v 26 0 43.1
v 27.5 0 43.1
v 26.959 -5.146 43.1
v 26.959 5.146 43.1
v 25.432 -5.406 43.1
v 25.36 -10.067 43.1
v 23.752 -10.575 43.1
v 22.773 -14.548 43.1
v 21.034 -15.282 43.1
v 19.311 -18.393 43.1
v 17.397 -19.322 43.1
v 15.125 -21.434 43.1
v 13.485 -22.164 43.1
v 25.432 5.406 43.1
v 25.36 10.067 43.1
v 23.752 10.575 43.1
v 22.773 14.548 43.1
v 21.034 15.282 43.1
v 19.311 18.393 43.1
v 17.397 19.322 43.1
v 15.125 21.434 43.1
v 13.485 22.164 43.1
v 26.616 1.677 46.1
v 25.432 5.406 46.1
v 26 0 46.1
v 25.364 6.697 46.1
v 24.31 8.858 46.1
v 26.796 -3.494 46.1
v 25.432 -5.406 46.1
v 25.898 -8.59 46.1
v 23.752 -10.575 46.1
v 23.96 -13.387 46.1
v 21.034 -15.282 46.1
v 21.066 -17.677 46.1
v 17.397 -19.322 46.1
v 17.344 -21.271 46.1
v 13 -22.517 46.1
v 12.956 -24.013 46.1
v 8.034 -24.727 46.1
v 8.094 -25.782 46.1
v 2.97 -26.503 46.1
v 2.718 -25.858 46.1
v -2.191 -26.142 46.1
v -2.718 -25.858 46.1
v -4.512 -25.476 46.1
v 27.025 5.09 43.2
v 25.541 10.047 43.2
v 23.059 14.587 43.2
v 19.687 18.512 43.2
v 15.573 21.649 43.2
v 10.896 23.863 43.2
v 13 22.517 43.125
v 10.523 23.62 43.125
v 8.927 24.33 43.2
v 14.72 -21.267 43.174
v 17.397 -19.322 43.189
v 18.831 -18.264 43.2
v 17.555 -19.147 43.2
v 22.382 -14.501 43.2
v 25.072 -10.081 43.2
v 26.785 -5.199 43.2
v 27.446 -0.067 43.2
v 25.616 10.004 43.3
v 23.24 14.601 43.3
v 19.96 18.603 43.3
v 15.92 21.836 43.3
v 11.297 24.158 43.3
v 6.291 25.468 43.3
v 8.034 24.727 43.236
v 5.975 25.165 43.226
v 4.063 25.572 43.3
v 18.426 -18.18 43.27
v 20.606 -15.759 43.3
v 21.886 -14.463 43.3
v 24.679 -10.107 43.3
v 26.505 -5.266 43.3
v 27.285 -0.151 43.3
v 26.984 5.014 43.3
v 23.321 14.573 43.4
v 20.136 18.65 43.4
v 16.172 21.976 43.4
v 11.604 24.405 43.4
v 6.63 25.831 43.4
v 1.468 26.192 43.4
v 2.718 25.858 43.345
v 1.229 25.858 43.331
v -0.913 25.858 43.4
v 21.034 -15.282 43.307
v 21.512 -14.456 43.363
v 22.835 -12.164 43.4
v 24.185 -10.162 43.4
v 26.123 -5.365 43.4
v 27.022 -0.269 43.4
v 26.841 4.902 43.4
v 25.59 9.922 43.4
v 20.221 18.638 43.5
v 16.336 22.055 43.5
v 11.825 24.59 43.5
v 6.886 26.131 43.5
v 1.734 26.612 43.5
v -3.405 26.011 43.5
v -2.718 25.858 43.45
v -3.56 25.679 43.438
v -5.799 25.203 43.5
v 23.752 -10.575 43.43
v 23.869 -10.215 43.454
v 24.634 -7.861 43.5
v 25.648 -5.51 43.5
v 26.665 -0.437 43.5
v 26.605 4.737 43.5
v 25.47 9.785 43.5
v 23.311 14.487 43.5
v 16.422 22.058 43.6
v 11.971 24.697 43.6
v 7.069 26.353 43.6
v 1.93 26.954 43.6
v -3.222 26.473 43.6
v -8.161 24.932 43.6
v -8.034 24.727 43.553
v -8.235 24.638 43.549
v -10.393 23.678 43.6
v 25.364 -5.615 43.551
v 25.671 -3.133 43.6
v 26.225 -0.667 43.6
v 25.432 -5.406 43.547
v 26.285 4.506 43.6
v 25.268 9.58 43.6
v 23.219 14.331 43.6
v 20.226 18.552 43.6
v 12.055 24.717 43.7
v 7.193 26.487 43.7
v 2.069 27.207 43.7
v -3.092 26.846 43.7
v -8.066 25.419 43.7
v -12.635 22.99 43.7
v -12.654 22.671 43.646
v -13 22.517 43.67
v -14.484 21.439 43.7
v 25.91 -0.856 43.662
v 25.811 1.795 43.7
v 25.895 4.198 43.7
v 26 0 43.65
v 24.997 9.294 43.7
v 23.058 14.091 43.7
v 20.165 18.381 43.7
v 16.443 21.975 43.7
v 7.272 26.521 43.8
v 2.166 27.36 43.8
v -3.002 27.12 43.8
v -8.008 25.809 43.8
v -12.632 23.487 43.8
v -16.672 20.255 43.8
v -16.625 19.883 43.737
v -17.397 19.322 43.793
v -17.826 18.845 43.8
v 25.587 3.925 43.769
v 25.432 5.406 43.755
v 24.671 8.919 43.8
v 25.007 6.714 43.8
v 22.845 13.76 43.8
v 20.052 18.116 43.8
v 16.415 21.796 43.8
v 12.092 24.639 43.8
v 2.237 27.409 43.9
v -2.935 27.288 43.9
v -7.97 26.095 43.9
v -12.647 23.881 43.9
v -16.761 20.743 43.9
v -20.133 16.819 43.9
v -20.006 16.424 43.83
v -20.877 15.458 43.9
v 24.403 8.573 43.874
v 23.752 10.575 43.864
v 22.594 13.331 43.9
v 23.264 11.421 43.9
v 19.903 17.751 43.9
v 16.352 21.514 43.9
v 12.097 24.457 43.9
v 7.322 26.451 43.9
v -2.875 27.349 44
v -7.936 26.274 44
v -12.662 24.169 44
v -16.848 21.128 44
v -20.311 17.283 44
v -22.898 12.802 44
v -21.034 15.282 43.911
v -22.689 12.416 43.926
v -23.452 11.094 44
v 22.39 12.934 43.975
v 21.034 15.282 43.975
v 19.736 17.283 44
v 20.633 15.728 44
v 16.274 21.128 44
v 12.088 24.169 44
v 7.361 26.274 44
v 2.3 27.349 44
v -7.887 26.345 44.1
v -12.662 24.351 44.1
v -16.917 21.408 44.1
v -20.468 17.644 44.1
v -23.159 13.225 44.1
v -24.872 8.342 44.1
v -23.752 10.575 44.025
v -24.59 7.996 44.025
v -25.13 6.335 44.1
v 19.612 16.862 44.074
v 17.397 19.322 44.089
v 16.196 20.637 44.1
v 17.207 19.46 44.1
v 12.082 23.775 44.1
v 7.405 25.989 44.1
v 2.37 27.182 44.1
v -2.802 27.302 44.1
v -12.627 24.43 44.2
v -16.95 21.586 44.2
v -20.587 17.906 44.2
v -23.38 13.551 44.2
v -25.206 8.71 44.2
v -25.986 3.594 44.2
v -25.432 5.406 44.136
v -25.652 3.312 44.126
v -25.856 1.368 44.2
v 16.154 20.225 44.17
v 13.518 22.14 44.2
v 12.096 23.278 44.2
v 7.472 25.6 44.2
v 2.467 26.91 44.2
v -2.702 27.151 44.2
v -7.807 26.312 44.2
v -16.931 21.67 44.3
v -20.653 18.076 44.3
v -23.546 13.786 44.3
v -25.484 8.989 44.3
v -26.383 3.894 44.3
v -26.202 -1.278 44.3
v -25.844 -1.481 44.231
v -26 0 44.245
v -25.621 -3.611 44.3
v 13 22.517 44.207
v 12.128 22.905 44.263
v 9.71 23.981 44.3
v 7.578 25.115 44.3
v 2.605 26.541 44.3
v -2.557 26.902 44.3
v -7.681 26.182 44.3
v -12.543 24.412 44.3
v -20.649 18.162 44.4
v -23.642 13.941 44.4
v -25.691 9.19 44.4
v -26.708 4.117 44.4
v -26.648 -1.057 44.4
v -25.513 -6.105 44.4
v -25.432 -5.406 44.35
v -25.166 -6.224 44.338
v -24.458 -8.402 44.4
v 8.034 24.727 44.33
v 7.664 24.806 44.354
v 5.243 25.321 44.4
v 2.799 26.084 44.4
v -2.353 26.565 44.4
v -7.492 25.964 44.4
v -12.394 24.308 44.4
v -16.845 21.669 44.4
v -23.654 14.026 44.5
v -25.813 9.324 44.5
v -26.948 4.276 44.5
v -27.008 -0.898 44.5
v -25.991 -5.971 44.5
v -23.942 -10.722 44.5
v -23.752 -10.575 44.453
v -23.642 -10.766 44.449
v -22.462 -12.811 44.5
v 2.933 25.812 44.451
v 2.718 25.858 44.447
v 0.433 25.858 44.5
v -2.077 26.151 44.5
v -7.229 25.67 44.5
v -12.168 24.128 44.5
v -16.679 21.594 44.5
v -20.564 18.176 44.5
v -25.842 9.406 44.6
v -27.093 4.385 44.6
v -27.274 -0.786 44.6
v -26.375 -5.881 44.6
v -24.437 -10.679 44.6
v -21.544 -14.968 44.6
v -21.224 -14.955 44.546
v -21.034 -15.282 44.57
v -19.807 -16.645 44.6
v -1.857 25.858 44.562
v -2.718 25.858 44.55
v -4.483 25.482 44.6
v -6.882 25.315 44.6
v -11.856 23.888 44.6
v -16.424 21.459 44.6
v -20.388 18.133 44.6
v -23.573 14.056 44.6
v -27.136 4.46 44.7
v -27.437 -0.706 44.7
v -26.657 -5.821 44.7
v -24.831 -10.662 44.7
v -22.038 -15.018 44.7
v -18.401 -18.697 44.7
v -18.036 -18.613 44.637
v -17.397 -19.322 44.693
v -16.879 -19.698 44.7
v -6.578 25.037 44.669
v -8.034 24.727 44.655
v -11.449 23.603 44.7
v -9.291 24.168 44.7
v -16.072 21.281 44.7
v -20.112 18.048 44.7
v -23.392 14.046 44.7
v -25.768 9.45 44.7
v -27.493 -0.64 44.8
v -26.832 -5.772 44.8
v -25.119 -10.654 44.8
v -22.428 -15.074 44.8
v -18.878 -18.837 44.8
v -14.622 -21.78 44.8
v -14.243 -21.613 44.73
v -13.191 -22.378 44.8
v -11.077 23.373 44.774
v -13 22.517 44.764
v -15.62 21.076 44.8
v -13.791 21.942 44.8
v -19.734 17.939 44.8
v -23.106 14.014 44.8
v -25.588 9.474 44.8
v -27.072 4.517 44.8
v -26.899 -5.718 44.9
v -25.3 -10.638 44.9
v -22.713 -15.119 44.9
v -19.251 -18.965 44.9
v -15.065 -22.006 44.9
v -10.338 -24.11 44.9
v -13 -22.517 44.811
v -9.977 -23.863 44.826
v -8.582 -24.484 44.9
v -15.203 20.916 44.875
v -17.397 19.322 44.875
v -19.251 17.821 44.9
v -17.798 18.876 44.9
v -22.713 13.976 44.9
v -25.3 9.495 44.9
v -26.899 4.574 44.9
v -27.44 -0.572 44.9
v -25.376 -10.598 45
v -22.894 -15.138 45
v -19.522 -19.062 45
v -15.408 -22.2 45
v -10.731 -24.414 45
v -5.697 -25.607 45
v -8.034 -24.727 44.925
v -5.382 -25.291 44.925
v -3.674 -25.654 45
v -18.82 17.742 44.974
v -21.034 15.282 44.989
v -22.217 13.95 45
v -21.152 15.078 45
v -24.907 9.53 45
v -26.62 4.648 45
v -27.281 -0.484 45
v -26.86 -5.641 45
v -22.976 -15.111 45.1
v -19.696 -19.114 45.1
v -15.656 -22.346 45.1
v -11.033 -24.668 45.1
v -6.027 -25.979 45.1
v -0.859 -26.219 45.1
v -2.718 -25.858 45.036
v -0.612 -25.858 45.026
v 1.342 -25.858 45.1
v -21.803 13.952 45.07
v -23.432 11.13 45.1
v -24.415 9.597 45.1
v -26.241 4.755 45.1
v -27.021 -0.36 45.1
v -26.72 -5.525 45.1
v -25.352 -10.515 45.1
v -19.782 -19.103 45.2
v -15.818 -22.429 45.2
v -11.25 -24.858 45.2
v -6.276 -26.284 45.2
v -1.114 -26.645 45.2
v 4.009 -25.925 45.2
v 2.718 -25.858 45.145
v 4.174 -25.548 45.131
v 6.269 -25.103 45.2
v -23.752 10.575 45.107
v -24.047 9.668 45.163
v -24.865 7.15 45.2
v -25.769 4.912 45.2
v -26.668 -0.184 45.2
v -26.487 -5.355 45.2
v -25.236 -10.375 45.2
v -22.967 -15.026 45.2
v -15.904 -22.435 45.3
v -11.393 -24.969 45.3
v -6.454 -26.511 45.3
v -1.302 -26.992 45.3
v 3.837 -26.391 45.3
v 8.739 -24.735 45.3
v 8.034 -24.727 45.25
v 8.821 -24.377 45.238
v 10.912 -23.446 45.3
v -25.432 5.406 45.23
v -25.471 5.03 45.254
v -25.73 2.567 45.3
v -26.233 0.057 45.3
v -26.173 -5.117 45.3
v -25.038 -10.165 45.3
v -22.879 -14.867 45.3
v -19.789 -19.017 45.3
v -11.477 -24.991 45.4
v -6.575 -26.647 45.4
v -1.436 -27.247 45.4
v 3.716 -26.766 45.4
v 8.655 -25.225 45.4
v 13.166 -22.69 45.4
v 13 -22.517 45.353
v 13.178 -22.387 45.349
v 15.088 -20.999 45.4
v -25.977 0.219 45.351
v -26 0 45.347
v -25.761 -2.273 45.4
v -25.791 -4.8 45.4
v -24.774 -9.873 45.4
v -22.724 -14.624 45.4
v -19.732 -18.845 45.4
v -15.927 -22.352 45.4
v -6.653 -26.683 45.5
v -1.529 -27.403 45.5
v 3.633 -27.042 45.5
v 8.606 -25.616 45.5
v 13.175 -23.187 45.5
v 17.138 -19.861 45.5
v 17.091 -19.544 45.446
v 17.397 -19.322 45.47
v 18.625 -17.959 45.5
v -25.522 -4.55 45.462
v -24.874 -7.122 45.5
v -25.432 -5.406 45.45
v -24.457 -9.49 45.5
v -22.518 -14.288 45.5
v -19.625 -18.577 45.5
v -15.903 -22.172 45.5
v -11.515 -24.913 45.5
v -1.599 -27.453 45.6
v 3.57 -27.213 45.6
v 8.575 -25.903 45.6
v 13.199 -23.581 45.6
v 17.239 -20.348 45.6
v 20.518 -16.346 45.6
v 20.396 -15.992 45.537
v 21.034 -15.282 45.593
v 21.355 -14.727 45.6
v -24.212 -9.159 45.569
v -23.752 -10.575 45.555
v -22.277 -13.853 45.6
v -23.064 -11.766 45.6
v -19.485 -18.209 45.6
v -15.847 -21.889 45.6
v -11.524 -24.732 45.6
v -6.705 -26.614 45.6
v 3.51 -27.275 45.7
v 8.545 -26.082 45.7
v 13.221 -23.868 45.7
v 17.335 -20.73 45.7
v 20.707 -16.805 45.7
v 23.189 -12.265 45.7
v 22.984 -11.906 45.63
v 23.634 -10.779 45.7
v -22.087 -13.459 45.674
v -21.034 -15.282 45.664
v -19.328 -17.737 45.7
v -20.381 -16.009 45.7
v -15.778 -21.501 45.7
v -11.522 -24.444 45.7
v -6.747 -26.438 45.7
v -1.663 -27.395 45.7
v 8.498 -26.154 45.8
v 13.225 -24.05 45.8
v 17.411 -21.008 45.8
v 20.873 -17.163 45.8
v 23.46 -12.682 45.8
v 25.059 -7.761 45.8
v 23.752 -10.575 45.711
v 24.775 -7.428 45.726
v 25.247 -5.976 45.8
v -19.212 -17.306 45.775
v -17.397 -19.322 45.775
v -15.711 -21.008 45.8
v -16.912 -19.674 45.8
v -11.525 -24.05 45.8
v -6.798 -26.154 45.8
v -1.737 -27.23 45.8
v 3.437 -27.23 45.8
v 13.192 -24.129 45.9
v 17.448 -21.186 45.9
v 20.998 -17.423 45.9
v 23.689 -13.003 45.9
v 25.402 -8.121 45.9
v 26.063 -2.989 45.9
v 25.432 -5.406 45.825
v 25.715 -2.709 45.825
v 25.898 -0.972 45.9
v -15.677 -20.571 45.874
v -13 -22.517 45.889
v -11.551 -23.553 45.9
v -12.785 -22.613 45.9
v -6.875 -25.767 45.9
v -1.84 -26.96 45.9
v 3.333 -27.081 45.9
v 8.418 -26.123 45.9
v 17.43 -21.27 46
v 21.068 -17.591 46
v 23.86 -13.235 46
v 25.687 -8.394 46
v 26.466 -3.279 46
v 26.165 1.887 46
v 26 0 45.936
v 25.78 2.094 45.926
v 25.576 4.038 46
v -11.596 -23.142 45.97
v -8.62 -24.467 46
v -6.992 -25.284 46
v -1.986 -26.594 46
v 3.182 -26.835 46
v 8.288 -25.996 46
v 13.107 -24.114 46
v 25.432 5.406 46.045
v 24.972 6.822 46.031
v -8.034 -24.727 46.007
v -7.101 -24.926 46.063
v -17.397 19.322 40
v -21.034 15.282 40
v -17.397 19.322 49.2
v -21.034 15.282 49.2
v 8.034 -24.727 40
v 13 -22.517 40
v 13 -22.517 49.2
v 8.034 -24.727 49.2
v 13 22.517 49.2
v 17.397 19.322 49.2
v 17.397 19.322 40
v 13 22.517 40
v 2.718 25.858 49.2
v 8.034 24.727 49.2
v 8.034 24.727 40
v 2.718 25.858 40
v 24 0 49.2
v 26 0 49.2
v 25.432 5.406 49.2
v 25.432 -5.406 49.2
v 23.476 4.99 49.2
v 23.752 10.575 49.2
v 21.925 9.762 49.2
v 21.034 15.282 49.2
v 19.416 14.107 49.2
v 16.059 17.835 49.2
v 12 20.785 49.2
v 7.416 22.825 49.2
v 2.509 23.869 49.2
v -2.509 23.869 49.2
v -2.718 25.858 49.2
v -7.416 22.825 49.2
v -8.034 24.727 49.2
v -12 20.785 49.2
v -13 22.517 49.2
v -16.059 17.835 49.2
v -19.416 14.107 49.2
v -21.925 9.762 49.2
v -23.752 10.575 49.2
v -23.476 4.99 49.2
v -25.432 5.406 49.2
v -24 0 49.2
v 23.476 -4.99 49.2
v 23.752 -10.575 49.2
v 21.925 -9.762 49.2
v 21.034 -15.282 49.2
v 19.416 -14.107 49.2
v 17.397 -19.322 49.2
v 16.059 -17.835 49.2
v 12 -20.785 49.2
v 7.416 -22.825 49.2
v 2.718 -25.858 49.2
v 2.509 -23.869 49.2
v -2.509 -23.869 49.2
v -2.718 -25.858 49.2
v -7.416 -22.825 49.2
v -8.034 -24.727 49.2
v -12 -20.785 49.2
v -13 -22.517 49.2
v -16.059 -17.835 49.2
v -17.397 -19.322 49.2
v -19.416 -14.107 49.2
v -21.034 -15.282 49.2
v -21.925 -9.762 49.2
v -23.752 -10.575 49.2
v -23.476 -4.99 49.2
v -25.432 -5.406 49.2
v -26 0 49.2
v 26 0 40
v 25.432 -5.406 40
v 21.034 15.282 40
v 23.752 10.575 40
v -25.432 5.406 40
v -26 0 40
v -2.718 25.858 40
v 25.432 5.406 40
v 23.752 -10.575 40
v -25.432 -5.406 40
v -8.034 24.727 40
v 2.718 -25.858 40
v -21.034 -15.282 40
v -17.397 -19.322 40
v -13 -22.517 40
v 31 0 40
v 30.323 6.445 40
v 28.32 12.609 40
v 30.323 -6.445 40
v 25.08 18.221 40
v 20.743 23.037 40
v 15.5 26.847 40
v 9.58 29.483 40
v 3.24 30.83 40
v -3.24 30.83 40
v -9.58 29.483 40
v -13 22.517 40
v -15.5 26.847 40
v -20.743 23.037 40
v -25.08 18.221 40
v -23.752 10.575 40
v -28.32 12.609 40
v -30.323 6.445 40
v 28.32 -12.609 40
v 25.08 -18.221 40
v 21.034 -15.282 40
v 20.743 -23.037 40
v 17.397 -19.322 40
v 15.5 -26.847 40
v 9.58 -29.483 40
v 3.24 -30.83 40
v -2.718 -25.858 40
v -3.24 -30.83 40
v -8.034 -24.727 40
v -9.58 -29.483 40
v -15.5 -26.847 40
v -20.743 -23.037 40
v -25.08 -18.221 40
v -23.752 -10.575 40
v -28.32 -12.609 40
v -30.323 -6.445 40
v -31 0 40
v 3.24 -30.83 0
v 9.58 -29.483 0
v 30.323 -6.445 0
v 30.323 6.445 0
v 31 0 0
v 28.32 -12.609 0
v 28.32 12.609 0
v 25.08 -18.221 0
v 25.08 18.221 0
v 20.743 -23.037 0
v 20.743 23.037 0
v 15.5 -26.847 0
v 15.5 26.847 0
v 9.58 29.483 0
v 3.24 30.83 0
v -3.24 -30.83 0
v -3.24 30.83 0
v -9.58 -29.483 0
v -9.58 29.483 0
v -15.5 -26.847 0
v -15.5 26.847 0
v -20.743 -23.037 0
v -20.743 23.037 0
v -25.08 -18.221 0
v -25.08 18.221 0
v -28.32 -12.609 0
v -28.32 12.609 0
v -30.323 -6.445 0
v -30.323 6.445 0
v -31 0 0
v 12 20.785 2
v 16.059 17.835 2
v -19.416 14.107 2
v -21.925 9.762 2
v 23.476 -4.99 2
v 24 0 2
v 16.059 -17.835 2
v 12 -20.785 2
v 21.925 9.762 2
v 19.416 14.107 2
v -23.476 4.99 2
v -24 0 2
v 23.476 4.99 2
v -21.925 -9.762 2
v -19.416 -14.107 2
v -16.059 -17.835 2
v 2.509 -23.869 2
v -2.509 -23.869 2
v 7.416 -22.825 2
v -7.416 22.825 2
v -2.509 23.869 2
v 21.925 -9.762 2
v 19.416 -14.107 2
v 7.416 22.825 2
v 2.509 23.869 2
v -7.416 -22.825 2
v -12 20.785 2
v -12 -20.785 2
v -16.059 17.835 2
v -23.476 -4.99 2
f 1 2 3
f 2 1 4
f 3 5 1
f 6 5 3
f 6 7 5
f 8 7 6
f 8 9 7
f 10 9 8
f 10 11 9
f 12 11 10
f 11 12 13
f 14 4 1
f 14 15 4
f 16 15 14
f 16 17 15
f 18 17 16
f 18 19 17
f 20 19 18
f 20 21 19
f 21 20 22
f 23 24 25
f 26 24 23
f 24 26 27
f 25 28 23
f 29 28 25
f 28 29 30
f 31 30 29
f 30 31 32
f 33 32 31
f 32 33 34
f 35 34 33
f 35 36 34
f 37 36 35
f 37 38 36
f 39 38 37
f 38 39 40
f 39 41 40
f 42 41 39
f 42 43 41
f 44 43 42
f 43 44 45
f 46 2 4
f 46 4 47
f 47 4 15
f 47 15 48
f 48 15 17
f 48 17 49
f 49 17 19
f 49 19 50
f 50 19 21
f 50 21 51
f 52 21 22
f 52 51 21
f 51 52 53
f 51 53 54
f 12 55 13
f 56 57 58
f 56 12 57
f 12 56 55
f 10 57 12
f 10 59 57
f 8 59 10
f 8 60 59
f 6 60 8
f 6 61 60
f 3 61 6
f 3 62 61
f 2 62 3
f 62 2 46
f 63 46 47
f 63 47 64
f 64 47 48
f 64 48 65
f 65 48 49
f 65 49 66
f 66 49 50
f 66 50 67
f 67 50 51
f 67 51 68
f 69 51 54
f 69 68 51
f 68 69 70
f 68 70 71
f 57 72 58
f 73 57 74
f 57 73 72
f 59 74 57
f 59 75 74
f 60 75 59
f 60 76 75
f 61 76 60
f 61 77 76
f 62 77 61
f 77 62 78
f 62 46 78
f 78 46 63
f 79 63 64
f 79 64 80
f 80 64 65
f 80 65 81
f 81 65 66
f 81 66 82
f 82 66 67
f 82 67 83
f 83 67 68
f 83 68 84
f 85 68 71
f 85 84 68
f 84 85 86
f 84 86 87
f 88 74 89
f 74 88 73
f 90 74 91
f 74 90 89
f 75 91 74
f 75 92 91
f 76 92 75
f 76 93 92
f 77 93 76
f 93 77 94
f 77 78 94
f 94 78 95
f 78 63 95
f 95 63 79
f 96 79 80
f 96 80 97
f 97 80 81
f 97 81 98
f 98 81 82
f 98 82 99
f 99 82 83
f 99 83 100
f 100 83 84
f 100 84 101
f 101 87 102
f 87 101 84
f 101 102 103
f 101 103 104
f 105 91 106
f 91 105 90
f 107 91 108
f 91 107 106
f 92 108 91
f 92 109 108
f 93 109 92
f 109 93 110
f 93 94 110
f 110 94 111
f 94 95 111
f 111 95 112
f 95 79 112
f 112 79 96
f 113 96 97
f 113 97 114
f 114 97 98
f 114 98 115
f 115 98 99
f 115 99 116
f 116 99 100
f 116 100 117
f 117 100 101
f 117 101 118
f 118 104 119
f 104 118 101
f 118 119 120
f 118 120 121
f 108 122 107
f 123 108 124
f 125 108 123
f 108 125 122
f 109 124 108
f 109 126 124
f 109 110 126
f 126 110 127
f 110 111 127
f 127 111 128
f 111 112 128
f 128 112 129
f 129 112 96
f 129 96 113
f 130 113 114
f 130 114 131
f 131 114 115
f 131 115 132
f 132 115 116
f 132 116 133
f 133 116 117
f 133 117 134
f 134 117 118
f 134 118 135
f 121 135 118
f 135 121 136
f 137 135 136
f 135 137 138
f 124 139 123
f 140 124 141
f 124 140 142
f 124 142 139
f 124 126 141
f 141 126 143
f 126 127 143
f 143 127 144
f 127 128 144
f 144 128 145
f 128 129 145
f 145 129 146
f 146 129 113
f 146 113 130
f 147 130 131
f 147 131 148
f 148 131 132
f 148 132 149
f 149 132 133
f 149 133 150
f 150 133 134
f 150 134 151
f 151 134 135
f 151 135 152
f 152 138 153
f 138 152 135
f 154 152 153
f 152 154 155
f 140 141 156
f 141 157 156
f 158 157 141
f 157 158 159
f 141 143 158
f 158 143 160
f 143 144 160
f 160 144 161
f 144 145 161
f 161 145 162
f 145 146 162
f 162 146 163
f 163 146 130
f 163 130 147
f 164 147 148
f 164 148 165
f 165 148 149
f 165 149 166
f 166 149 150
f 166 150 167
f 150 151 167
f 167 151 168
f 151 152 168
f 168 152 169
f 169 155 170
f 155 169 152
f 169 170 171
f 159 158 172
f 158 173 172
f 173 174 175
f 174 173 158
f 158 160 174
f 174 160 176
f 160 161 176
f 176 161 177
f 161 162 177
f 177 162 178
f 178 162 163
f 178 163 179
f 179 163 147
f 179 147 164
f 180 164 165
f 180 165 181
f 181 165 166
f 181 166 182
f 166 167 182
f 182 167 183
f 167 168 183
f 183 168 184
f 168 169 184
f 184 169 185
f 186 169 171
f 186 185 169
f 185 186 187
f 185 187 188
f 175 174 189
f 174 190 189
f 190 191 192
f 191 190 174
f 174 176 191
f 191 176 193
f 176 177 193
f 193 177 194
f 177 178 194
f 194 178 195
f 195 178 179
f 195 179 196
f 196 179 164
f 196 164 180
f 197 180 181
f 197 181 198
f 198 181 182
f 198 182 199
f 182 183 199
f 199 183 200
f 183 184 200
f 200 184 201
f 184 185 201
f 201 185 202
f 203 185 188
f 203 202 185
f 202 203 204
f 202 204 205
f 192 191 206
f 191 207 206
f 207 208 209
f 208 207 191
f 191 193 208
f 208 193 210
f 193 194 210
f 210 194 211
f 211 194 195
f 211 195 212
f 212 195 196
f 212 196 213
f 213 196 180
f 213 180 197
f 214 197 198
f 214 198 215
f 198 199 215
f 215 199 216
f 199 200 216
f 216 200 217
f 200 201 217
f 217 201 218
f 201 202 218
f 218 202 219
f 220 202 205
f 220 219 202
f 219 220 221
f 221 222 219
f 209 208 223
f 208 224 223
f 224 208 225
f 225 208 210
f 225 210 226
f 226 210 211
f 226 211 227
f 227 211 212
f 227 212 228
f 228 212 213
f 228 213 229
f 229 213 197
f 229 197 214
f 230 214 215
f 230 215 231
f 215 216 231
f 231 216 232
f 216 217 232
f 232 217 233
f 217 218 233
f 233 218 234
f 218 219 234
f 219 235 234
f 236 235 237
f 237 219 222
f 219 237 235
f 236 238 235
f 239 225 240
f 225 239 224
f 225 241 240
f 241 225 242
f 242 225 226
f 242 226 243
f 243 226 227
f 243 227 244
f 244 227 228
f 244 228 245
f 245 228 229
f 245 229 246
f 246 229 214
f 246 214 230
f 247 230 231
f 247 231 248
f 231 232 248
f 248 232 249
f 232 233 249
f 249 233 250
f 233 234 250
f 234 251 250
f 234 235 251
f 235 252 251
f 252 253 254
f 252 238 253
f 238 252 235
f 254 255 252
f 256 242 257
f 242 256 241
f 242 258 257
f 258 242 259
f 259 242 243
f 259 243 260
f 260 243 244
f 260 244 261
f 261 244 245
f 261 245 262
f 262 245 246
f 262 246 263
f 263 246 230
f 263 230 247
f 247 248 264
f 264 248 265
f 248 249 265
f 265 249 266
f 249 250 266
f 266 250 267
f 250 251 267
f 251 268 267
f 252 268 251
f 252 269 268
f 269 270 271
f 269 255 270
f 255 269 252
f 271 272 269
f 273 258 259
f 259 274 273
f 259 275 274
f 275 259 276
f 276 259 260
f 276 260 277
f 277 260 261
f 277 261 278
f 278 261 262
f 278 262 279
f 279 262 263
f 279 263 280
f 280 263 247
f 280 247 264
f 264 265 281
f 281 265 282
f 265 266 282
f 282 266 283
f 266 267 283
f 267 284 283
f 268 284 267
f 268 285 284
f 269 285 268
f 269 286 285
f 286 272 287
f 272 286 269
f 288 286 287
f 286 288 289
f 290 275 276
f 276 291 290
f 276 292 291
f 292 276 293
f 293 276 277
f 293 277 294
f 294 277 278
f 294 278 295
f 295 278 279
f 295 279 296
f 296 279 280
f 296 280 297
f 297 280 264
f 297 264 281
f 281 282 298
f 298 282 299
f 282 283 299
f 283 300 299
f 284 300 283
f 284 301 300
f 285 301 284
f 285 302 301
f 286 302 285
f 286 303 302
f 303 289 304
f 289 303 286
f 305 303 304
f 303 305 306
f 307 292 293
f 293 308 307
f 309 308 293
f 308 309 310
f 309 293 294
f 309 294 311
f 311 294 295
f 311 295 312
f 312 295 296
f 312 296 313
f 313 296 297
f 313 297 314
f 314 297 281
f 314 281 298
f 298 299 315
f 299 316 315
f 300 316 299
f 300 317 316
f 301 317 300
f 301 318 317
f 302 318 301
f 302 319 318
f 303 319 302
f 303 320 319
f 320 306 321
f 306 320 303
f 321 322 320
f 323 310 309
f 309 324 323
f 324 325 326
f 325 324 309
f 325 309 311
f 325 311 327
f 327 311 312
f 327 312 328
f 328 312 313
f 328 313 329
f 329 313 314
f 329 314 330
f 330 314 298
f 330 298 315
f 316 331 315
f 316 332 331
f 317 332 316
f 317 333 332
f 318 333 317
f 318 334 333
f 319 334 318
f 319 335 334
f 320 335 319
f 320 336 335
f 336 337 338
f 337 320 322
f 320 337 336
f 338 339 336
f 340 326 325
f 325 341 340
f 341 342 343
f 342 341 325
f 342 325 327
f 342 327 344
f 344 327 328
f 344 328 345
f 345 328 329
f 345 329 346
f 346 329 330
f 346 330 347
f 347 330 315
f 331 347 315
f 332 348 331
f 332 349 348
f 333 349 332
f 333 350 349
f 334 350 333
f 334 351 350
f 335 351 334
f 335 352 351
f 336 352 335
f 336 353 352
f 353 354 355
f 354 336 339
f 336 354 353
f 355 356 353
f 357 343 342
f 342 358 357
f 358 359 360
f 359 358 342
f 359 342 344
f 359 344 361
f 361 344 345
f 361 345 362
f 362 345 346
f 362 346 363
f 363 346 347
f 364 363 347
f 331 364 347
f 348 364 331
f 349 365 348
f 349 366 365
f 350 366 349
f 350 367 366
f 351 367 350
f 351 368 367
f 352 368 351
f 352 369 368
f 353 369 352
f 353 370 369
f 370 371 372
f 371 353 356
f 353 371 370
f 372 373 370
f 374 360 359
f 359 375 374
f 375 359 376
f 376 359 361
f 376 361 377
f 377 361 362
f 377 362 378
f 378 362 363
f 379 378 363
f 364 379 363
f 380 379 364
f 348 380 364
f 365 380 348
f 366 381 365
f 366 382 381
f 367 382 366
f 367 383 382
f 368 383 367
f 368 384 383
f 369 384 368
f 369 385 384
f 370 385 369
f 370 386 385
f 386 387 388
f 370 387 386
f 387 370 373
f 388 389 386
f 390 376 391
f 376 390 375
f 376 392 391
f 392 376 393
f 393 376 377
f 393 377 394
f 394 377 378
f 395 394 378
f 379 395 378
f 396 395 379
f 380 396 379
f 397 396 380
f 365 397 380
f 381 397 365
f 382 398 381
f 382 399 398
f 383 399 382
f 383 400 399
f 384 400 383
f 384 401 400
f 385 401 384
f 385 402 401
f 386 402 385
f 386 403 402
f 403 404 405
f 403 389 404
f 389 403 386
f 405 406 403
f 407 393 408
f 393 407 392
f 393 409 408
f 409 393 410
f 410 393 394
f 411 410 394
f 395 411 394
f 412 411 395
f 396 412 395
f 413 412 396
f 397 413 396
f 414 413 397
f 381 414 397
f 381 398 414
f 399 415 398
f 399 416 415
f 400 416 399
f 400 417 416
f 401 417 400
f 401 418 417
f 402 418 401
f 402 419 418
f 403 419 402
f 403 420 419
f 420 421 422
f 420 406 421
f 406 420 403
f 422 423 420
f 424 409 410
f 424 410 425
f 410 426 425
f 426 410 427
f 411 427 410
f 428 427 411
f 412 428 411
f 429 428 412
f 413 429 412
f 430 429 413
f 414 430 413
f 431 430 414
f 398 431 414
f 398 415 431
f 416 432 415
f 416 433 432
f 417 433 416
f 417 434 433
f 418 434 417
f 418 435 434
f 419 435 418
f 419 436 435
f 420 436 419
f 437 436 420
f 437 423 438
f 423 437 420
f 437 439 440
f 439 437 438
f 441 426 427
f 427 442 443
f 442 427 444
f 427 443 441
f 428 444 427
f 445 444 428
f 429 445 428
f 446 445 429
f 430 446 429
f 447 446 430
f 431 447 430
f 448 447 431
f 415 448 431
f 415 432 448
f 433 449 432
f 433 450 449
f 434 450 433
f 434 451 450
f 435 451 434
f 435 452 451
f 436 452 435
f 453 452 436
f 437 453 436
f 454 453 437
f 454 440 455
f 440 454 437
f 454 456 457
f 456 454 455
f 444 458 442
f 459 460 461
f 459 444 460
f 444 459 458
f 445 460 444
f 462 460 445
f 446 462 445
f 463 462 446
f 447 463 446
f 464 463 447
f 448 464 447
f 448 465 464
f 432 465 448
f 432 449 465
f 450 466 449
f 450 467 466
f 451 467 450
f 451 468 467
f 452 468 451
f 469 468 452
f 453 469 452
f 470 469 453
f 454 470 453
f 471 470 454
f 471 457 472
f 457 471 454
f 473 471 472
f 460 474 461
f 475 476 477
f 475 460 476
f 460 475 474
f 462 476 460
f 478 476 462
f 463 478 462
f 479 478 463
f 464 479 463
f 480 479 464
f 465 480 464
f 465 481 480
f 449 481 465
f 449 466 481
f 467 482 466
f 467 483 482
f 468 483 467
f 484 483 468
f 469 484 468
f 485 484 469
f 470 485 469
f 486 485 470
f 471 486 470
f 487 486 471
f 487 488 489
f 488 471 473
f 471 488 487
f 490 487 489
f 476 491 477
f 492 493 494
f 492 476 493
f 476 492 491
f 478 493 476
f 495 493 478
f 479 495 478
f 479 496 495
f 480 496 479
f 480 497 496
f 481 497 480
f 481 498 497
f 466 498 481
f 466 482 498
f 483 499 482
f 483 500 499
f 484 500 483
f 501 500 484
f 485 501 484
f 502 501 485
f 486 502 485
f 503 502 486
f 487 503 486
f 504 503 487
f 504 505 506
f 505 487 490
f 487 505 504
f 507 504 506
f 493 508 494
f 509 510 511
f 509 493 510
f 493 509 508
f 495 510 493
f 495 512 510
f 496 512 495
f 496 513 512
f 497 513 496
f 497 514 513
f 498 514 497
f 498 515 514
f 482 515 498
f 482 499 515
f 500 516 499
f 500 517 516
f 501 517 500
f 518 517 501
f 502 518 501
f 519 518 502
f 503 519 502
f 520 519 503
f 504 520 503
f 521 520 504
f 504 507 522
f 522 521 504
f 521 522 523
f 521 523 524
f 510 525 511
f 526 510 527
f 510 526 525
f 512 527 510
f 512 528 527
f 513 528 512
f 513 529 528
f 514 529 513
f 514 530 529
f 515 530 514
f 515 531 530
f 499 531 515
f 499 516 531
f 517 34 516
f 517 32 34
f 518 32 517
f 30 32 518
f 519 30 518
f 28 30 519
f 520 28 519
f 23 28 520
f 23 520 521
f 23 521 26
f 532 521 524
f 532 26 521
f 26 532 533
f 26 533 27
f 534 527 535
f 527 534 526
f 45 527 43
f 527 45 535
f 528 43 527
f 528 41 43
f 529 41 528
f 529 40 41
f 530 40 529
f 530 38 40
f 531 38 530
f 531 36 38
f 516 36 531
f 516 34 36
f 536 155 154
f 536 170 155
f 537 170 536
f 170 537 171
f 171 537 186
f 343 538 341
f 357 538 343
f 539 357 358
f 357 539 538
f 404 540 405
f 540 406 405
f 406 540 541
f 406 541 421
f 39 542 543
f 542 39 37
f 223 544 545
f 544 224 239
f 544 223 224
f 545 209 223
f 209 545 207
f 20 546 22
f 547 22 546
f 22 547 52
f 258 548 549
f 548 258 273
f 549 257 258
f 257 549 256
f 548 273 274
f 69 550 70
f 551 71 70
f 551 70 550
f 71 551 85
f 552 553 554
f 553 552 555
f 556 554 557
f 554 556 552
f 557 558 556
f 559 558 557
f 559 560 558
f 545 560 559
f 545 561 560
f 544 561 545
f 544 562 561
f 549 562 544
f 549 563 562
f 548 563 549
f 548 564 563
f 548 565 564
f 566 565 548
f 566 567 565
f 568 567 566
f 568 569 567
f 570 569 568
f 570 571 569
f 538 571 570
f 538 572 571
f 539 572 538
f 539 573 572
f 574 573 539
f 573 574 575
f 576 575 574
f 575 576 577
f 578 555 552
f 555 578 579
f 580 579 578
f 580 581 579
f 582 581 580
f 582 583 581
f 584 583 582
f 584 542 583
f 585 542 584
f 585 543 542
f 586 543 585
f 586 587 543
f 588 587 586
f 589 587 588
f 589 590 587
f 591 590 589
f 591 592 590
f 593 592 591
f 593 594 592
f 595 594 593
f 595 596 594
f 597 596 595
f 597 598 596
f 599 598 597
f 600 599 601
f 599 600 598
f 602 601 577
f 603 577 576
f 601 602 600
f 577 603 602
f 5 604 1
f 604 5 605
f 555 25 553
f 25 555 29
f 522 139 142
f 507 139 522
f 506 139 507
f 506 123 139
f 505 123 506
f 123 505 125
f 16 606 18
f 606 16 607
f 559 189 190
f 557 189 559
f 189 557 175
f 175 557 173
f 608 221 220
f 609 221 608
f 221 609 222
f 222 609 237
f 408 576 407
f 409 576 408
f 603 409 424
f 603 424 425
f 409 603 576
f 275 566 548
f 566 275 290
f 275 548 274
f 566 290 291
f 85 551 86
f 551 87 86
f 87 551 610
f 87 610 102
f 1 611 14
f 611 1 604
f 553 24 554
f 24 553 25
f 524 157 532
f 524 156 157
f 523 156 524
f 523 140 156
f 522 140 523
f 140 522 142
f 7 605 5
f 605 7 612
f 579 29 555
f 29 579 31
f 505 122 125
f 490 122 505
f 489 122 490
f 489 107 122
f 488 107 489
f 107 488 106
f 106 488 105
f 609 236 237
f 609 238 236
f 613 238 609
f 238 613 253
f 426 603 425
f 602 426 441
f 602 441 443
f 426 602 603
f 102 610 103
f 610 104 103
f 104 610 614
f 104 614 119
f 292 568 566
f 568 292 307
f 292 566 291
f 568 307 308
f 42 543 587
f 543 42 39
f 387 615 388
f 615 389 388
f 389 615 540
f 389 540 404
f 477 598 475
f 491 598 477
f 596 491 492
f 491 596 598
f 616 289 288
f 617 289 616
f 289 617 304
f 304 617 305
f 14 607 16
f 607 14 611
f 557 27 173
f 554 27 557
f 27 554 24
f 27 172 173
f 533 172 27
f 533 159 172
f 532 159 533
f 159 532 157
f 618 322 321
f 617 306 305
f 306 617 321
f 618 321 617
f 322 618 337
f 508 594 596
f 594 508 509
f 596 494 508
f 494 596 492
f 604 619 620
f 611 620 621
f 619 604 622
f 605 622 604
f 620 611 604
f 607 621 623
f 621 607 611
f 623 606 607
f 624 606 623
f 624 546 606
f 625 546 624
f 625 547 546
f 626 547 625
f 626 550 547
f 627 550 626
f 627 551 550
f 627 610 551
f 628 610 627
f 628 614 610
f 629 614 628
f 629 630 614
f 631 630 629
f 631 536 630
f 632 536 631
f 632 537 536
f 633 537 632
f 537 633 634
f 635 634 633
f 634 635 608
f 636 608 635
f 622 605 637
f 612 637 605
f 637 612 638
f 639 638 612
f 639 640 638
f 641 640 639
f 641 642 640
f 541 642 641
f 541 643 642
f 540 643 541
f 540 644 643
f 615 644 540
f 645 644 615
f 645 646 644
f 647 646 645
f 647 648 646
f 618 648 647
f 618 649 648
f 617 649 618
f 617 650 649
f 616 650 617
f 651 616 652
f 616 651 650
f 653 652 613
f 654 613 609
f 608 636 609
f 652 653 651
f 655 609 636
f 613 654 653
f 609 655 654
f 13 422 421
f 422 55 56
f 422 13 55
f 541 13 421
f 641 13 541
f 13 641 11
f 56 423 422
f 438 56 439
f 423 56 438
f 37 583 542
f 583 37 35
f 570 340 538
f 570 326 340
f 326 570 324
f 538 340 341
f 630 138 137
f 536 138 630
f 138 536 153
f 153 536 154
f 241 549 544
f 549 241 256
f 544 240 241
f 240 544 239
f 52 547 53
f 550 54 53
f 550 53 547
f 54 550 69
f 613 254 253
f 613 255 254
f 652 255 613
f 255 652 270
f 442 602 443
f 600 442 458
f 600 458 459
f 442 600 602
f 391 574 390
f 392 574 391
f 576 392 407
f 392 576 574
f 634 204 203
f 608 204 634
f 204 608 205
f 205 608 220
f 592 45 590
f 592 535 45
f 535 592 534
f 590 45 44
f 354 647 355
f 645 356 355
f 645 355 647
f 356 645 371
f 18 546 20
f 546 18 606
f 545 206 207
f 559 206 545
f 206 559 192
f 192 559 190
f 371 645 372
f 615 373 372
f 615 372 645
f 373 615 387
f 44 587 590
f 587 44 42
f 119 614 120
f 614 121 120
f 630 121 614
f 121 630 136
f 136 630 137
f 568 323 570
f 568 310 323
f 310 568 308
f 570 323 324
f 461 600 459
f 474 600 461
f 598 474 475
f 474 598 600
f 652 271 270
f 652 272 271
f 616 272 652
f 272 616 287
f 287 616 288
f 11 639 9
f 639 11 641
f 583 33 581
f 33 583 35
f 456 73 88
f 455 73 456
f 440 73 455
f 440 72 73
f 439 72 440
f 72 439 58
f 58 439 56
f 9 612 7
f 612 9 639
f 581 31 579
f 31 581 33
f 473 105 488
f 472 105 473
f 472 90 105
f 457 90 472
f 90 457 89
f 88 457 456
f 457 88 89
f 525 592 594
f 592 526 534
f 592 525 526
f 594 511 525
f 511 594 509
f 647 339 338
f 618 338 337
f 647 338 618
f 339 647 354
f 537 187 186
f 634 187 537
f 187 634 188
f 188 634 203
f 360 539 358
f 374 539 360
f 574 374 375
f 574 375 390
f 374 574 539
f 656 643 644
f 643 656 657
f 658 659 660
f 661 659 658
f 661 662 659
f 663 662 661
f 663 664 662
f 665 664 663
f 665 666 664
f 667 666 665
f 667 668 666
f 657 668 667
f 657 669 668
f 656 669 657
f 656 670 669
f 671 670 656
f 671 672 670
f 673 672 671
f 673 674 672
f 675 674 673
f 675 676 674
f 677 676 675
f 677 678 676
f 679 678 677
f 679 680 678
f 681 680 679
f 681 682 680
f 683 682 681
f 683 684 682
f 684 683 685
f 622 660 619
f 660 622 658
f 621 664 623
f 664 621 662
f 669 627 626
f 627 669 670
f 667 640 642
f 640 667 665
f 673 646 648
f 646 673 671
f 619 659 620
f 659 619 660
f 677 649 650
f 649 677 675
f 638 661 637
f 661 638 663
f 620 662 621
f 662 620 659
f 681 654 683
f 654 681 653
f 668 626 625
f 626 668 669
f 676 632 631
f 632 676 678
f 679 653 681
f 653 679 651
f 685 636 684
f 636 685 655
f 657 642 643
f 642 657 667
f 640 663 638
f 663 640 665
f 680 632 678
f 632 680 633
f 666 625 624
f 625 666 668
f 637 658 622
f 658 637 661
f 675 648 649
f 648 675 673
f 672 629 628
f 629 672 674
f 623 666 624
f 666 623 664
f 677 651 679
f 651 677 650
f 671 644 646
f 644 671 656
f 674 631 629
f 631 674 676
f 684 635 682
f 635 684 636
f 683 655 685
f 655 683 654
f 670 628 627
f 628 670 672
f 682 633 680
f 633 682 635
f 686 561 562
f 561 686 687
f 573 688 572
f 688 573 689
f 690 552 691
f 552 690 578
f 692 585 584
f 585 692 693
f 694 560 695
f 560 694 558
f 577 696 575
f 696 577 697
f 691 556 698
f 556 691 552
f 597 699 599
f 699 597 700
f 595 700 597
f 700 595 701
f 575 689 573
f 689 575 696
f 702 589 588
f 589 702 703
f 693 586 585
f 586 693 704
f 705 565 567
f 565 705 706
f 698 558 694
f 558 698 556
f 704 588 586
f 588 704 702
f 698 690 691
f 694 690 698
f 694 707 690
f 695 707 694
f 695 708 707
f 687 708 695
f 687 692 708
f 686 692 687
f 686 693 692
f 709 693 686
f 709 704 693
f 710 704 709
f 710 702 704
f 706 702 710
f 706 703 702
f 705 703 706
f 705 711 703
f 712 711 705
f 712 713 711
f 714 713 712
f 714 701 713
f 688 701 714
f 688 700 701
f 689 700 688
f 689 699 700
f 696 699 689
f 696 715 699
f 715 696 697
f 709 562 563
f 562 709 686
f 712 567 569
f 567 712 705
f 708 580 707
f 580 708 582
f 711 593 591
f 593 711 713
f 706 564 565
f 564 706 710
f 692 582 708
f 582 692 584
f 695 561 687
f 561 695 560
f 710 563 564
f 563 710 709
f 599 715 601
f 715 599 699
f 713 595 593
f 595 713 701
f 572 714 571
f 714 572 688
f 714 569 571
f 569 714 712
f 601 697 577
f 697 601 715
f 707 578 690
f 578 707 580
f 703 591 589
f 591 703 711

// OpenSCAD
// outer diameter of jar in mm
DIAMETER_OUTER = 62;

//  currently not for all walls in mm
WALL_THICKNESS = 2;

// height of jar without walls for thread
HEIGHT = 40;

// thickness (height) of thread, must be 0 < x < 1 (0 very sharp, 1 very thick)
THREAD_THICKNESS = 0.9;

// outer diameter of wall where thread is in mm
DIAMETER_THREAD_WALL = 52;

//
THREAD_HEIGHT = 3;

// how many degrees for thread
TWIST = -320;

// should be >= THREAD_HEIGHT
HEIGHT_THREAD_WALL =  9.2;

// outer diameter of thread in mm
THREAD_DIAMETER_OUTER = 55;


// -----------------------------------------------------


$fn = 30;


difference() {
    union() {
        cylinder(d=DIAMETER_OUTER, h=HEIGHT);
        translate([0., 0., HEIGHT])
            thread();
    }

    // inside
    translate([0., 0., WALL_THICKNESS])
        cylinder(d=DIAMETER_THREAD_WALL - 2*WALL_THICKNESS, h=HEIGHT * 2);
}


// need to subtract inside
module thread() {
    translate([0., 0., (HEIGHT_THREAD_WALL - THREAD_HEIGHT)/2.]) {
        thread_outer_radius = THREAD_DIAMETER_OUTER/2.;
        linear_extrude(height=THREAD_HEIGHT, convexity = 5, twist = TWIST, slices=$fn, $fn = $fn)
            translate([(1 - THREAD_THICKNESS) * thread_outer_radius, 0., 0.])
                circle(r=THREAD_THICKNESS * thread_outer_radius);
    }

    // thread wall
    cylinder(d=DIAMETER_THREAD_WALL, h=HEIGHT_THREAD_WALL);
}
